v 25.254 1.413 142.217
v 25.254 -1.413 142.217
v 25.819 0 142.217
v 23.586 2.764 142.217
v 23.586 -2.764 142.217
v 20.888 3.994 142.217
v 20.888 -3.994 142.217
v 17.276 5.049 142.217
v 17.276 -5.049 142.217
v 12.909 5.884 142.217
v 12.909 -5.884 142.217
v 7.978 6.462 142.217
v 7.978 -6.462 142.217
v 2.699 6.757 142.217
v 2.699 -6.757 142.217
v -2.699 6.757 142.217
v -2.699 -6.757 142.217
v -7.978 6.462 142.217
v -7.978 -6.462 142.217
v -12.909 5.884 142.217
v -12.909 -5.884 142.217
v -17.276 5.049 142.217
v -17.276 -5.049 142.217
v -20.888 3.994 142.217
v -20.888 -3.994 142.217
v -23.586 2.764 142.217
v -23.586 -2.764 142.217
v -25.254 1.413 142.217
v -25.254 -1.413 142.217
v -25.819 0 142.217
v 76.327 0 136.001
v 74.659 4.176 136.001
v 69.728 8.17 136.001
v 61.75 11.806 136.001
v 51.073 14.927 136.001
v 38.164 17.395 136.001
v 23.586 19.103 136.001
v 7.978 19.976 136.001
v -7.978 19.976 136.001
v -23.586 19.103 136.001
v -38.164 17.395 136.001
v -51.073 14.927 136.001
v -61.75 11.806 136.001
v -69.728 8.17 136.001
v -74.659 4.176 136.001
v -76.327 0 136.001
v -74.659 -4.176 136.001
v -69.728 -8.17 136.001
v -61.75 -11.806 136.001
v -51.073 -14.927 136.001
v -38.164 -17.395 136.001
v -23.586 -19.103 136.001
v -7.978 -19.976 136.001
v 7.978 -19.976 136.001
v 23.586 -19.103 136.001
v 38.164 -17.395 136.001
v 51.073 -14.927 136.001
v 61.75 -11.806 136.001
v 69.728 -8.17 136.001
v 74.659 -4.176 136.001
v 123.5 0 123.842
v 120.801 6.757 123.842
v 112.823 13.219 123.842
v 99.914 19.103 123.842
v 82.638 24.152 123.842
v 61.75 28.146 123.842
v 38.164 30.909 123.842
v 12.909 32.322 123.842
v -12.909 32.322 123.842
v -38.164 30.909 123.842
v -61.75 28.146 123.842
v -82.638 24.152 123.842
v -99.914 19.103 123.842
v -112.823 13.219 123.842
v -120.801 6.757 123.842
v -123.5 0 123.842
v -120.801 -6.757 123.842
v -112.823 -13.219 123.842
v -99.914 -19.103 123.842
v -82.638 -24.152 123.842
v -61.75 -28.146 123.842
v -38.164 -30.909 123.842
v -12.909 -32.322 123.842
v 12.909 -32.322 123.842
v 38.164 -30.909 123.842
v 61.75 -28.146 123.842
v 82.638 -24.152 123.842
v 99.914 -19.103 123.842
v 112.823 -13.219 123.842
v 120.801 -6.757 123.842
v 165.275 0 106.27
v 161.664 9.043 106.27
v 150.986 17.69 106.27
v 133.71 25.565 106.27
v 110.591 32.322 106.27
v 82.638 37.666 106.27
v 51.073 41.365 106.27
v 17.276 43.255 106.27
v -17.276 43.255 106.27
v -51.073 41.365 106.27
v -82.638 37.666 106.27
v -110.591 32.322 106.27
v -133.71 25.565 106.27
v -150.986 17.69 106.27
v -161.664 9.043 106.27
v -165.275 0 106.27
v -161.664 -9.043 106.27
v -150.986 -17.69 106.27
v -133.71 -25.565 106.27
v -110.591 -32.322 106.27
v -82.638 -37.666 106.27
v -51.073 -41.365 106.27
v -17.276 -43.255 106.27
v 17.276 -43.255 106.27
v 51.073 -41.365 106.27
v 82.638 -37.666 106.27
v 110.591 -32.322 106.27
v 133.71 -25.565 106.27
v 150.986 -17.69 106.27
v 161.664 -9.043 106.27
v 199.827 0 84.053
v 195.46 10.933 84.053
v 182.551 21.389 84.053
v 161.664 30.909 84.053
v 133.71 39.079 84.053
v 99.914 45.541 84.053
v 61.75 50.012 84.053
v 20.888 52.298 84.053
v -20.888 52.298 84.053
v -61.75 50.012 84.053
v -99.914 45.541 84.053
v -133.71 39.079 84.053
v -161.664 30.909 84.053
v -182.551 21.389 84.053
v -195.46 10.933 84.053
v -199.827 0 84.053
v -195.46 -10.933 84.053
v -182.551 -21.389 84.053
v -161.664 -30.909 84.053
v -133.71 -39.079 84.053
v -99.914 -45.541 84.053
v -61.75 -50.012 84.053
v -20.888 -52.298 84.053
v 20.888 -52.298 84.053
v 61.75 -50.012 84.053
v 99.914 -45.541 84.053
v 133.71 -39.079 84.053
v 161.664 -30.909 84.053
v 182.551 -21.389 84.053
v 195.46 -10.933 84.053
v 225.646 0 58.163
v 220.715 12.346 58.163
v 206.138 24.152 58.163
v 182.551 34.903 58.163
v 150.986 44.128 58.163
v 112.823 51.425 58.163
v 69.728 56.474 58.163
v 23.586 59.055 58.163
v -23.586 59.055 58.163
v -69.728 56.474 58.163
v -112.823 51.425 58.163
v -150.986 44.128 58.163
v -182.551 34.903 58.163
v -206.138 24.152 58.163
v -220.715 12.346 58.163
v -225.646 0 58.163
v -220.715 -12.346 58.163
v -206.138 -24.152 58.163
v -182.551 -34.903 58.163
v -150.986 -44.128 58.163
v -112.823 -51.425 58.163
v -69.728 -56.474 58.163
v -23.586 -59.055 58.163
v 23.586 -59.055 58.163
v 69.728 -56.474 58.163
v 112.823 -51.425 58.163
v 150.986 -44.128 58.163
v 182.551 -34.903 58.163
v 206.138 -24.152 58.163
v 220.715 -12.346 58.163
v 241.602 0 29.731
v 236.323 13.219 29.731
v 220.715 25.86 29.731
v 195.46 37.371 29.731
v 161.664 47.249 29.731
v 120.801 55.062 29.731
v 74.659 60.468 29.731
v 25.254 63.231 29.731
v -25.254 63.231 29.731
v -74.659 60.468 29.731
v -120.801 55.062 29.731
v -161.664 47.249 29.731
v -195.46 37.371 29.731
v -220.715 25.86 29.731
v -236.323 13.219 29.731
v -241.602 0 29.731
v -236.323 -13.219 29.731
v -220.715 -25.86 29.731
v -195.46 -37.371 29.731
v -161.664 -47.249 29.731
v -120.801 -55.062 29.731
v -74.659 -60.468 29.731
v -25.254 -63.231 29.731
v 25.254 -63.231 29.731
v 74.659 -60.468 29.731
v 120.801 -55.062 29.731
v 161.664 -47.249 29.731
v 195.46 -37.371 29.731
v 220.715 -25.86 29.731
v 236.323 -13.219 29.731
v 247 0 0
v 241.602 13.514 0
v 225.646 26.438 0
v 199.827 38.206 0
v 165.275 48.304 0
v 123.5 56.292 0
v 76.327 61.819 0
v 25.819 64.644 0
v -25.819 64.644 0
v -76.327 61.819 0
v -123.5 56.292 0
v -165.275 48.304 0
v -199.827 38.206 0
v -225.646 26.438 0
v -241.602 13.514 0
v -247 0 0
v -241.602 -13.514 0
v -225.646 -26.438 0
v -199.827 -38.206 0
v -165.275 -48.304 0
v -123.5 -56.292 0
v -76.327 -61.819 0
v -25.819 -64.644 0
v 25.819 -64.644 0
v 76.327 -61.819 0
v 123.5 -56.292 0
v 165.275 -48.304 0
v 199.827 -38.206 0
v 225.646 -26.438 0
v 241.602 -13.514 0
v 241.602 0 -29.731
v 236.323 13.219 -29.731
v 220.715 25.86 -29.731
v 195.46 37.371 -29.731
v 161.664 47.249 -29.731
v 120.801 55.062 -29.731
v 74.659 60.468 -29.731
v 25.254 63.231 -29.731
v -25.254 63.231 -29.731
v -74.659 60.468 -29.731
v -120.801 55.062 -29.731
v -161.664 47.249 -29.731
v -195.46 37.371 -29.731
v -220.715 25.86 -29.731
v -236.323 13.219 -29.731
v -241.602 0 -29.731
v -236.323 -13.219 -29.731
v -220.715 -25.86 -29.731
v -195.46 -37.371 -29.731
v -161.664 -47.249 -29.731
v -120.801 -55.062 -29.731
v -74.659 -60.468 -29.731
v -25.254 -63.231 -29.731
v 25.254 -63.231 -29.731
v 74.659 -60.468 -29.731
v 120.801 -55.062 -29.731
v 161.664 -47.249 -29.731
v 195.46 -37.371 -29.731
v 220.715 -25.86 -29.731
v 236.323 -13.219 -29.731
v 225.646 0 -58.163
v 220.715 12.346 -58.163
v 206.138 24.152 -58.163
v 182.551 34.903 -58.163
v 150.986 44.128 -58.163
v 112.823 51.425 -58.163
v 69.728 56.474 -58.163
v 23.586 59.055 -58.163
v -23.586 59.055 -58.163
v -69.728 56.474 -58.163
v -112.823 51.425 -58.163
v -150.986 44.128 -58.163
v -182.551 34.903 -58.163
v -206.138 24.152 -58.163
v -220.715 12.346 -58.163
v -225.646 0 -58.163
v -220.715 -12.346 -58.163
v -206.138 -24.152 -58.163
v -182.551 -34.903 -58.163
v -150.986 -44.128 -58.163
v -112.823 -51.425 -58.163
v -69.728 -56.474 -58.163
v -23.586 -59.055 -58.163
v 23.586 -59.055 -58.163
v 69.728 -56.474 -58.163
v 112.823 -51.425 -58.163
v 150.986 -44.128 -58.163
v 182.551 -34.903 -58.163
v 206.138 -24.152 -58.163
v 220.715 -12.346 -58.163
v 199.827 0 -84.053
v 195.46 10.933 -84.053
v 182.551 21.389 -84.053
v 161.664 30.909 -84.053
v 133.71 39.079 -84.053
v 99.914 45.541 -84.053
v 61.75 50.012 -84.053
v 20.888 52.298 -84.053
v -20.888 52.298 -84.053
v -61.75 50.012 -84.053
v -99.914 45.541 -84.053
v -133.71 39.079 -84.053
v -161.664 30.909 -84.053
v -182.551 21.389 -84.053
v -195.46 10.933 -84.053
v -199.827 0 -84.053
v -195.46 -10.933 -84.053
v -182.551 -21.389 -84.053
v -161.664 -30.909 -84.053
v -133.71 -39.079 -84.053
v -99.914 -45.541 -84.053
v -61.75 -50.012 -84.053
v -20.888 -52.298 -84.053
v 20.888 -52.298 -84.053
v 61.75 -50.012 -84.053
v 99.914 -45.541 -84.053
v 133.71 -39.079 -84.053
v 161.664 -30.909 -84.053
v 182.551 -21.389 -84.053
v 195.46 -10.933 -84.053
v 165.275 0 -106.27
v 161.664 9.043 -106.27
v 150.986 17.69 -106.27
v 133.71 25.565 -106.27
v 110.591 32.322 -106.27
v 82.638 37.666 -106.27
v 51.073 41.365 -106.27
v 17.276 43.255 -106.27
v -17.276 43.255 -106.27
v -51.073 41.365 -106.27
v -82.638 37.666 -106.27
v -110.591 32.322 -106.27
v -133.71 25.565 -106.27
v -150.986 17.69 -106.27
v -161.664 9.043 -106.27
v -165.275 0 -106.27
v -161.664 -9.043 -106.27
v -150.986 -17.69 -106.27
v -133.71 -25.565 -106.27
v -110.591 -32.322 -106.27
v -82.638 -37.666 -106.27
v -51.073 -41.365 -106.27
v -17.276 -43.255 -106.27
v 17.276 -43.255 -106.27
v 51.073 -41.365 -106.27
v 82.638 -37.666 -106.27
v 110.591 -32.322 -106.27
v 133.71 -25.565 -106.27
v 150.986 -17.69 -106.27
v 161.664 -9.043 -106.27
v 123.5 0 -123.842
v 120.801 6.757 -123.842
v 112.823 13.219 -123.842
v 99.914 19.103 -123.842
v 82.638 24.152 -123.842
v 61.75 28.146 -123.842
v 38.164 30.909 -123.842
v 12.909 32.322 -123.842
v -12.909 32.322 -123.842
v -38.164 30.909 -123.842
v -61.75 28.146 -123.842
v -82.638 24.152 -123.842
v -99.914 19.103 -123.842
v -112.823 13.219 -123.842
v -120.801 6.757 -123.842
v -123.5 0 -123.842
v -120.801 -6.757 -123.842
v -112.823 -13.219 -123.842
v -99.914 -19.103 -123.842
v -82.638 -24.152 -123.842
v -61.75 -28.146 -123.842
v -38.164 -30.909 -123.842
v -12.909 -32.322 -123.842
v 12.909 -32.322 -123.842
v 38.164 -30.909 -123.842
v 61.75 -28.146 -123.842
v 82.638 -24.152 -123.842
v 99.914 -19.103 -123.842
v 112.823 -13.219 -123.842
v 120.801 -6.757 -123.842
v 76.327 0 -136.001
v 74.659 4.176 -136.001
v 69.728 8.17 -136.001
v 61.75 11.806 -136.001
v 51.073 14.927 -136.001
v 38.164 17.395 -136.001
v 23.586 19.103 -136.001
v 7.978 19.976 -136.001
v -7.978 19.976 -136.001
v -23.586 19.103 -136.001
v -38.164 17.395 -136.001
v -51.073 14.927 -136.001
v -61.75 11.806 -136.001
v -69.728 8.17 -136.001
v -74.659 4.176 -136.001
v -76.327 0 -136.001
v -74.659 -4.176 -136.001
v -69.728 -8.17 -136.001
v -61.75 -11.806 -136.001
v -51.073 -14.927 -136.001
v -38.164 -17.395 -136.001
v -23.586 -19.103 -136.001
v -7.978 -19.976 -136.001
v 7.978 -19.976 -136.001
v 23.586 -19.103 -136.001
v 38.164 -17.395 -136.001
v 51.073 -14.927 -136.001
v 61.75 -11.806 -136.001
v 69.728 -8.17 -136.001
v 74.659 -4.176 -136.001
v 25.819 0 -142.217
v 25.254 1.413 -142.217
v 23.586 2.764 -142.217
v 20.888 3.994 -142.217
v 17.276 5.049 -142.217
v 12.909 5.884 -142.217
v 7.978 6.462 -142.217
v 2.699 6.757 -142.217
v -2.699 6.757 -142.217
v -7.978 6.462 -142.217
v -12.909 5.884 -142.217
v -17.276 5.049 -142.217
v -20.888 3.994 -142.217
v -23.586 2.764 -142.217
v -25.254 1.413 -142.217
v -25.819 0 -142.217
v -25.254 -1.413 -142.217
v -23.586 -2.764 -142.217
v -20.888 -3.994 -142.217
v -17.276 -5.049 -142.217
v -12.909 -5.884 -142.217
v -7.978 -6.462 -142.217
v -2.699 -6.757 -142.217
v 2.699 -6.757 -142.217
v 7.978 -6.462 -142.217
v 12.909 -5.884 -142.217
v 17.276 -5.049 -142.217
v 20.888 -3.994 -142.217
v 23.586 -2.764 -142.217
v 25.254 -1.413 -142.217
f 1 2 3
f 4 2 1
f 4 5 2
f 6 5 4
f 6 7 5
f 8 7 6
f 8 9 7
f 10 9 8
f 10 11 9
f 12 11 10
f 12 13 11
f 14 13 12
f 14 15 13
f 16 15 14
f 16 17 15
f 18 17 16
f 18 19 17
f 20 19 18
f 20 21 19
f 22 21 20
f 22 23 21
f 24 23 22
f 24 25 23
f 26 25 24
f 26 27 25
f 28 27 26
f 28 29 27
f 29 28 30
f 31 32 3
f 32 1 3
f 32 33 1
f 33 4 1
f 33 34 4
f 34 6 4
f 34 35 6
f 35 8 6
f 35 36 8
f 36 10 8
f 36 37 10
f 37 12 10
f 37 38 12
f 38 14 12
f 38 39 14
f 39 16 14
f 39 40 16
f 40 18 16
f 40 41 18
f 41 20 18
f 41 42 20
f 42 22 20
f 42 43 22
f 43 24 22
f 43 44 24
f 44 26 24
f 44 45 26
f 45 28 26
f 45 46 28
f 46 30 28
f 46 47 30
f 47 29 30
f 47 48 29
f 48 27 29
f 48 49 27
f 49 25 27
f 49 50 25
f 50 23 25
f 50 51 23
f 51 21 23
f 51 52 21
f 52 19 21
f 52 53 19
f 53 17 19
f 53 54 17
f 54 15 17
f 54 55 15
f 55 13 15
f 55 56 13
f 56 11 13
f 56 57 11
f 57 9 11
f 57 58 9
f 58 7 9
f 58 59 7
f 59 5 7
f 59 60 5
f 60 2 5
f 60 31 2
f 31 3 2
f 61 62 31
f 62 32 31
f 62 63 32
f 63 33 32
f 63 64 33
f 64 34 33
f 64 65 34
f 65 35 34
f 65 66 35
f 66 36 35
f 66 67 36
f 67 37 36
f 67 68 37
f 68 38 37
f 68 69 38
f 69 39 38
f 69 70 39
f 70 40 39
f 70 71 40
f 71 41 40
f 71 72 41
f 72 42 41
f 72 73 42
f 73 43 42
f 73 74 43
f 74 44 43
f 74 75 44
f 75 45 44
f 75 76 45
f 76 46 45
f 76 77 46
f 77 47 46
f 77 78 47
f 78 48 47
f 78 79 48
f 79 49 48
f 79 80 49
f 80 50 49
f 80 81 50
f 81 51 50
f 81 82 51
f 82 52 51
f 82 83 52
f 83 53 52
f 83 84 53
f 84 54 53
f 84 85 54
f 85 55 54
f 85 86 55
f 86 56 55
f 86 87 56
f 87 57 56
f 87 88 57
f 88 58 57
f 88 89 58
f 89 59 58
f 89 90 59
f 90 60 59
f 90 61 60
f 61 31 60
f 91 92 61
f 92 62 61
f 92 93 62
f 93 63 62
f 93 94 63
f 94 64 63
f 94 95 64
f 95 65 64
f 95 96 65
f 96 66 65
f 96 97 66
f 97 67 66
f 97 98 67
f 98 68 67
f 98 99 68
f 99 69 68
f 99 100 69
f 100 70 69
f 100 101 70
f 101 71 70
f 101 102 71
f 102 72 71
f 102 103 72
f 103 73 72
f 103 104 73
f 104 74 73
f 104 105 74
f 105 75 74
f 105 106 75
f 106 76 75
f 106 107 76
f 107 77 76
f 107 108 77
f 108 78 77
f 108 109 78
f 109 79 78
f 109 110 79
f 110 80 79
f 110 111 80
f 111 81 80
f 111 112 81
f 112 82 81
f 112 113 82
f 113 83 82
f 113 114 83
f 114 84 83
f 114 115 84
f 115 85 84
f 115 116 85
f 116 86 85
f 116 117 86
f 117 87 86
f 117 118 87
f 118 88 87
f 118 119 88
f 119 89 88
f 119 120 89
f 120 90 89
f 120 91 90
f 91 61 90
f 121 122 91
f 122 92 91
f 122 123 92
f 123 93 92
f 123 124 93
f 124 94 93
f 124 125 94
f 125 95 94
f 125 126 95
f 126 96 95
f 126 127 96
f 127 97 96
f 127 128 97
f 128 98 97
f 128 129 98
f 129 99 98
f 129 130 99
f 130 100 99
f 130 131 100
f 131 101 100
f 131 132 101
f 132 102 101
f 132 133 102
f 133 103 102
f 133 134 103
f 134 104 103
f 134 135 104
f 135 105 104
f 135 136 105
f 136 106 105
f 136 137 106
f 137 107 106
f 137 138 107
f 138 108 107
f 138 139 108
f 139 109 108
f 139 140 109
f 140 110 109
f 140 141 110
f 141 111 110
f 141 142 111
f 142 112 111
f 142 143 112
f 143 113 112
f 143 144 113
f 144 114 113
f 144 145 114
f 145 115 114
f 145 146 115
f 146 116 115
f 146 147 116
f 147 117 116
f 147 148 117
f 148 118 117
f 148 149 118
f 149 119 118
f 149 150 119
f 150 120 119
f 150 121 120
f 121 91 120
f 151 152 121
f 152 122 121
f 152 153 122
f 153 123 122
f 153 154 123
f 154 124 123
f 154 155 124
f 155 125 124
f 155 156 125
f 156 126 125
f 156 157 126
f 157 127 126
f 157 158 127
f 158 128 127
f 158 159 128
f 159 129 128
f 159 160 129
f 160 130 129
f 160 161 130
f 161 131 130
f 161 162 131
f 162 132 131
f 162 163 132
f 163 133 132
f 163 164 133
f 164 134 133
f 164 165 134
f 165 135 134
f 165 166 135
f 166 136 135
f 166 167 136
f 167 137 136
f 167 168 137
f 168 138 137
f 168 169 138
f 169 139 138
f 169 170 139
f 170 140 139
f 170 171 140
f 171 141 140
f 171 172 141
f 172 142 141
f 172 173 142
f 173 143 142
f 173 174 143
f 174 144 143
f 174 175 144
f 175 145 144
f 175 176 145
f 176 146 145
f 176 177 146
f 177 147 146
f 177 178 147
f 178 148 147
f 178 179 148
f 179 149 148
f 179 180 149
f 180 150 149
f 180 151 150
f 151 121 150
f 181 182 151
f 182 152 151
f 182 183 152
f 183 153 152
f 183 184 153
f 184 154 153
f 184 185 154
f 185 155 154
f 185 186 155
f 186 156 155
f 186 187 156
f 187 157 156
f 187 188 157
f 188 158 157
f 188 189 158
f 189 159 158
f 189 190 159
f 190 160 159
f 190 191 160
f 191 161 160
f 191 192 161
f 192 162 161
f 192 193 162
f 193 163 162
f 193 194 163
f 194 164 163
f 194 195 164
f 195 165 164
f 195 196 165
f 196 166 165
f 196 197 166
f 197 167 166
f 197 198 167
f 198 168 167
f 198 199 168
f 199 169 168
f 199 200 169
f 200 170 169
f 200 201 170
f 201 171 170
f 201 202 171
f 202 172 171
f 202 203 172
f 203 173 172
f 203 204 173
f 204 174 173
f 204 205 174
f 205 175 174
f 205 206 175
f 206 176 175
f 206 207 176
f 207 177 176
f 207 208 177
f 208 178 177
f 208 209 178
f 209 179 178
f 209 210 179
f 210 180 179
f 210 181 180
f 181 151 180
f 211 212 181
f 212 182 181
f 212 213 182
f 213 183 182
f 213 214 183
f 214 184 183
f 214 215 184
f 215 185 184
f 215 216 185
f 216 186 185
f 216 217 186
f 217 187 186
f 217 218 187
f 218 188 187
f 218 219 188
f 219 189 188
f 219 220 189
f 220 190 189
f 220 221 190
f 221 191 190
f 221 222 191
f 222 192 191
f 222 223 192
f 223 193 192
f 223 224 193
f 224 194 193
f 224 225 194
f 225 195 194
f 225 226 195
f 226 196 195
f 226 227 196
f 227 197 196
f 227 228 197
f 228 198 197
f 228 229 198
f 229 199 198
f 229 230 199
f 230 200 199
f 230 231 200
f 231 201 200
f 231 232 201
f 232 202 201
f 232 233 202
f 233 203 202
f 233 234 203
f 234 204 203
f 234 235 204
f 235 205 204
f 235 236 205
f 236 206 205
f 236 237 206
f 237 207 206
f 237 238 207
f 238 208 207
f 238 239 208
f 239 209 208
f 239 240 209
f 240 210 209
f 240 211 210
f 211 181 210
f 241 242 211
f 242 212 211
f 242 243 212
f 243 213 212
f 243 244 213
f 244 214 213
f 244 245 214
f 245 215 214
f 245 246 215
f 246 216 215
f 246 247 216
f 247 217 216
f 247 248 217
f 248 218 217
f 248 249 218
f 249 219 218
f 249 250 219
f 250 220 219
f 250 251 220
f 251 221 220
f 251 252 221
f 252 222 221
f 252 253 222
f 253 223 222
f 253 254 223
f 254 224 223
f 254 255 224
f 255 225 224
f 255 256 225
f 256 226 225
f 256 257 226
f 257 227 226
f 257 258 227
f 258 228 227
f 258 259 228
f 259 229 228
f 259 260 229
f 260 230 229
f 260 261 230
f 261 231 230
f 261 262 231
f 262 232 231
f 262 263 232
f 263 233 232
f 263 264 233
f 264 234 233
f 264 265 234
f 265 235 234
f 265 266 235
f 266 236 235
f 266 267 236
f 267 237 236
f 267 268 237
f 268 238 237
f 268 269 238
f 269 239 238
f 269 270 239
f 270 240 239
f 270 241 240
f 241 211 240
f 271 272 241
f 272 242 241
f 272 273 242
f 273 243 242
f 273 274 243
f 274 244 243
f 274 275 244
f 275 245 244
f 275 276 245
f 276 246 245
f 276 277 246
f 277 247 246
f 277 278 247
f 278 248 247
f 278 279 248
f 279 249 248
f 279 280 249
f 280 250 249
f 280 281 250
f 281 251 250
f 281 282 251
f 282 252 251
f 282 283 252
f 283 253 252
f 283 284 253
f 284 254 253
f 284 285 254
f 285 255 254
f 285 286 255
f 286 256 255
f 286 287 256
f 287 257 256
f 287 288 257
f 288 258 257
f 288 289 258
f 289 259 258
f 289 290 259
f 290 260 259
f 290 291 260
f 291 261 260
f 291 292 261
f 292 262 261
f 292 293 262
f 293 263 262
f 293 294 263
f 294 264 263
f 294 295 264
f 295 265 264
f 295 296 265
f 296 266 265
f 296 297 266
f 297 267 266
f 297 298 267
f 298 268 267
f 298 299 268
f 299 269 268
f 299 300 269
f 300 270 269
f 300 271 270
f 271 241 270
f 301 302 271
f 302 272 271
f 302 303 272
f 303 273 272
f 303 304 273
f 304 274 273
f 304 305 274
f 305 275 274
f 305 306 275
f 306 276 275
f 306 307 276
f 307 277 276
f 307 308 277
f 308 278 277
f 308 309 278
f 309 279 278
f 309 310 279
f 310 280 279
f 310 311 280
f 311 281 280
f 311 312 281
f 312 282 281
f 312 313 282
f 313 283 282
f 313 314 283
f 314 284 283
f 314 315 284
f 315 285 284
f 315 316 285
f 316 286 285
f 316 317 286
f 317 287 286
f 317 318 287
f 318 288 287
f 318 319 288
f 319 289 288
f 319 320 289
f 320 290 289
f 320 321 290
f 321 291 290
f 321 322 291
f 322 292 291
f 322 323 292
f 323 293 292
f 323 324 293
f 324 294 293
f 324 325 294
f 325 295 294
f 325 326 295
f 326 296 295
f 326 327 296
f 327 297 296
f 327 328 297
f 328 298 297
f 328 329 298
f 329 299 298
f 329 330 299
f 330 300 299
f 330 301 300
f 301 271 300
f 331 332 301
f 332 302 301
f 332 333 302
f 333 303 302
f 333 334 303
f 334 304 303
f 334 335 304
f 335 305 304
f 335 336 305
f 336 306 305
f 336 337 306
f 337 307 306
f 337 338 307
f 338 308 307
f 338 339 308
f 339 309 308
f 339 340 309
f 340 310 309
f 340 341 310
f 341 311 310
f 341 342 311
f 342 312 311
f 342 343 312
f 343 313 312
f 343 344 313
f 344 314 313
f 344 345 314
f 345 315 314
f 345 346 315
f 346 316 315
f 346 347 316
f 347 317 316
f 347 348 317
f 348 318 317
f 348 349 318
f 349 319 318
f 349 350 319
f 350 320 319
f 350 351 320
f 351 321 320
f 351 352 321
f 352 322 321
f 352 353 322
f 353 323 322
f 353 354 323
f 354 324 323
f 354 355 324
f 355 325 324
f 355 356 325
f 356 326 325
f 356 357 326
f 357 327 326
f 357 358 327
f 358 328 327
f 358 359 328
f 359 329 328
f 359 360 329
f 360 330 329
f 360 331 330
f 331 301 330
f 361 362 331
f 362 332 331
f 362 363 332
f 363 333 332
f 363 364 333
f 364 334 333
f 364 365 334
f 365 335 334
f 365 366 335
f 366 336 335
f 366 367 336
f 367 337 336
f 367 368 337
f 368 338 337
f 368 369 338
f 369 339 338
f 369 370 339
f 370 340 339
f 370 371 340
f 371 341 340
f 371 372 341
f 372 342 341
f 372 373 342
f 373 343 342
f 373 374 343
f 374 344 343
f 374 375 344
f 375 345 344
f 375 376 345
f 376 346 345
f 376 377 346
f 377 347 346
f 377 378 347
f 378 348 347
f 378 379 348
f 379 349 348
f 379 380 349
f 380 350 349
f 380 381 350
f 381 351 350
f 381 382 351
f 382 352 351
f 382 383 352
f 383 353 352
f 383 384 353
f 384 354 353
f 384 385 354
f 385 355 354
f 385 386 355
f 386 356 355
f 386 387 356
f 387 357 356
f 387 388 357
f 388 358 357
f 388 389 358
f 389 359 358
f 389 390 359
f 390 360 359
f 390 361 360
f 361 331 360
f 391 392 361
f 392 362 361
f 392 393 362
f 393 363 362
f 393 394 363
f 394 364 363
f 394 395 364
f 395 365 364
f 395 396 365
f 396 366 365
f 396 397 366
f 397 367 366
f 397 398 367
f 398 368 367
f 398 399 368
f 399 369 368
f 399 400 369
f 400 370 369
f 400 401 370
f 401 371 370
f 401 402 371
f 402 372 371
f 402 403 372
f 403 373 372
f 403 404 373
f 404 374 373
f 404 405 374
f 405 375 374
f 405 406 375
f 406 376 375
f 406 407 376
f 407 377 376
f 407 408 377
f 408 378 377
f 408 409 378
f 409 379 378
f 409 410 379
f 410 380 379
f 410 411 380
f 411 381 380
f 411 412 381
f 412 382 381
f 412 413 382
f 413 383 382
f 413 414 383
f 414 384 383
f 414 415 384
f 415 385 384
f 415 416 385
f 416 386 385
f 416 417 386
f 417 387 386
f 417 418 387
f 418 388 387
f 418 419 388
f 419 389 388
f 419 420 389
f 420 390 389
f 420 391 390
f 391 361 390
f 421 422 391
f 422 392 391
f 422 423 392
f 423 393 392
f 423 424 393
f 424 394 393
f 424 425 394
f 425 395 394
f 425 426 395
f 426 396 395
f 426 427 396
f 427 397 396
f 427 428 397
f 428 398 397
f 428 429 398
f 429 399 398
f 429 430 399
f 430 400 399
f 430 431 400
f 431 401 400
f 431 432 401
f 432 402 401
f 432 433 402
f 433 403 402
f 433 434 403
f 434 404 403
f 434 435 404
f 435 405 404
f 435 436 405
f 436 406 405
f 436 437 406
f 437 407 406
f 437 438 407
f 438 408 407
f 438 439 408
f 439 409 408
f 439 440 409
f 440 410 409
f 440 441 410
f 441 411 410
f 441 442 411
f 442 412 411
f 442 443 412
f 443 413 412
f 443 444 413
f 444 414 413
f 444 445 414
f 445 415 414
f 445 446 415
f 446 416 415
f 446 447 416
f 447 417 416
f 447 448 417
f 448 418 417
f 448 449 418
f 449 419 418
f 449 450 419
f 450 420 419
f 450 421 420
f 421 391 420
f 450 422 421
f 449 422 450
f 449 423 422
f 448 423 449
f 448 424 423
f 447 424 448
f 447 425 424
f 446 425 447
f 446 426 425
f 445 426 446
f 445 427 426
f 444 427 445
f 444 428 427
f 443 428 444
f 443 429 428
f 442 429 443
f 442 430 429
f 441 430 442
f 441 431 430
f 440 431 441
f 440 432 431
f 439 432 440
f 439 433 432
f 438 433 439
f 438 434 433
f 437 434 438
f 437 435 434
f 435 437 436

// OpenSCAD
// Generated by SolidPython 1.0.1 on 2020-07-29 00:46:53


scale(v = [19, 5, 11]) {
	sphere(r = 13);
}
/***********************************************
*********      SolidPython code:      **********
************************************************
 
# import packages: SolidPython
from solid import *
from solid.utils import *
from itertools import chain, combinations, permutations


class Resize:

    def __init__(self, scad_file):
        self.scad_file = scad_file
        #self.scad_file = import_scad(scad_file)
        # cone/cylinder param:
        self.r1 = 0
        self.r2 = 0
        self.h = 0
        # rectangular prism param:
        self.w = 0
        self.l = 0
        # ellipse param:
        self.r = 0

    # import OpenScad code (file name corresponds to shape)


    # classify shape + parameters
    def assign(self, param1, param2, param3):
        if self.scad_file == 'cone.scad':
            self.r1 = param1
            self.r2 = param2
            self.h = param3
        elif self.scad_file == 'cylinder.scad':
            self.r1 = param1
            self.r2 = param2
            self.h = param3
        elif self.scad_file == 'rectangularPrism.scad':
            self.h = param1
            self.l = param2
            self.w = param3
        else:
            self.r = param1
            self.h = param2

    # resize parameters
    def iterate(self):
        x = range(3, 20, 2)
        i = 1
        if self.scad_file == 'cone.scad':
            tempList = list(permutations(x, 2))
            for temp in tempList:
                param1 = temp[0]
                param2 = temp[1]
                filepath = 'produced_scad_files/' + 'cone' + str(param1) + '_' + str(param2) + '_' + '.scad'
                scad_render_to_file(cylinder(h=param1, r1=param2, r2=0), filepath)

        elif self.scad_file == 'cylinder.scad':
            tempList = list(permutations(x, 3))
            for temp in tempList:
                param1 = temp[0]
                param2 = temp[1]
                filepath = 'produced_scad_files/' + 'cylinder' + str(param1) + '_' + str(param2) + '_' + '.scad'
                scad_render_to_file(cylinder(h=param1, r1=param2, r2=param2), filepath)

        elif self.scad_file == 'rectangularPrism.scad':
            tempList = list(permutations(x, 3))
            for temp in tempList:
                param1 = temp[0]
                param2 = temp[1]
                param3 = temp[2]
                filepath = 'produced_scad_files/' + 'rectangularPrism' + str(param1) + '_' + str(param2) + '_' + str(
                    param3) + '.scad'
                scad_render_to_file(cube(size=(param1, param2, param3)), filepath)

        elif self.scad_file == 'ellipse.scad':
            tempList = list(permutations(x, 4))
            for temp in tempList:
                param1 = temp[0]
                param2 = temp[1]
                param3 = temp[2]
                param4 = temp[3]
                filepath = 'produced_scad_files/' + 'ellipse' + str(param1) + '_' + str(param2) + '_' + str(param3) + '_' + str(param4) + '.scad'
                scad_render_to_file(scale([param1, param2, param3])(sphere(r=param4)), filepath)

    def render_to_scadfile(self):
        scad_render_to_file(scad, 'example.scad') 
 
************************************************/
